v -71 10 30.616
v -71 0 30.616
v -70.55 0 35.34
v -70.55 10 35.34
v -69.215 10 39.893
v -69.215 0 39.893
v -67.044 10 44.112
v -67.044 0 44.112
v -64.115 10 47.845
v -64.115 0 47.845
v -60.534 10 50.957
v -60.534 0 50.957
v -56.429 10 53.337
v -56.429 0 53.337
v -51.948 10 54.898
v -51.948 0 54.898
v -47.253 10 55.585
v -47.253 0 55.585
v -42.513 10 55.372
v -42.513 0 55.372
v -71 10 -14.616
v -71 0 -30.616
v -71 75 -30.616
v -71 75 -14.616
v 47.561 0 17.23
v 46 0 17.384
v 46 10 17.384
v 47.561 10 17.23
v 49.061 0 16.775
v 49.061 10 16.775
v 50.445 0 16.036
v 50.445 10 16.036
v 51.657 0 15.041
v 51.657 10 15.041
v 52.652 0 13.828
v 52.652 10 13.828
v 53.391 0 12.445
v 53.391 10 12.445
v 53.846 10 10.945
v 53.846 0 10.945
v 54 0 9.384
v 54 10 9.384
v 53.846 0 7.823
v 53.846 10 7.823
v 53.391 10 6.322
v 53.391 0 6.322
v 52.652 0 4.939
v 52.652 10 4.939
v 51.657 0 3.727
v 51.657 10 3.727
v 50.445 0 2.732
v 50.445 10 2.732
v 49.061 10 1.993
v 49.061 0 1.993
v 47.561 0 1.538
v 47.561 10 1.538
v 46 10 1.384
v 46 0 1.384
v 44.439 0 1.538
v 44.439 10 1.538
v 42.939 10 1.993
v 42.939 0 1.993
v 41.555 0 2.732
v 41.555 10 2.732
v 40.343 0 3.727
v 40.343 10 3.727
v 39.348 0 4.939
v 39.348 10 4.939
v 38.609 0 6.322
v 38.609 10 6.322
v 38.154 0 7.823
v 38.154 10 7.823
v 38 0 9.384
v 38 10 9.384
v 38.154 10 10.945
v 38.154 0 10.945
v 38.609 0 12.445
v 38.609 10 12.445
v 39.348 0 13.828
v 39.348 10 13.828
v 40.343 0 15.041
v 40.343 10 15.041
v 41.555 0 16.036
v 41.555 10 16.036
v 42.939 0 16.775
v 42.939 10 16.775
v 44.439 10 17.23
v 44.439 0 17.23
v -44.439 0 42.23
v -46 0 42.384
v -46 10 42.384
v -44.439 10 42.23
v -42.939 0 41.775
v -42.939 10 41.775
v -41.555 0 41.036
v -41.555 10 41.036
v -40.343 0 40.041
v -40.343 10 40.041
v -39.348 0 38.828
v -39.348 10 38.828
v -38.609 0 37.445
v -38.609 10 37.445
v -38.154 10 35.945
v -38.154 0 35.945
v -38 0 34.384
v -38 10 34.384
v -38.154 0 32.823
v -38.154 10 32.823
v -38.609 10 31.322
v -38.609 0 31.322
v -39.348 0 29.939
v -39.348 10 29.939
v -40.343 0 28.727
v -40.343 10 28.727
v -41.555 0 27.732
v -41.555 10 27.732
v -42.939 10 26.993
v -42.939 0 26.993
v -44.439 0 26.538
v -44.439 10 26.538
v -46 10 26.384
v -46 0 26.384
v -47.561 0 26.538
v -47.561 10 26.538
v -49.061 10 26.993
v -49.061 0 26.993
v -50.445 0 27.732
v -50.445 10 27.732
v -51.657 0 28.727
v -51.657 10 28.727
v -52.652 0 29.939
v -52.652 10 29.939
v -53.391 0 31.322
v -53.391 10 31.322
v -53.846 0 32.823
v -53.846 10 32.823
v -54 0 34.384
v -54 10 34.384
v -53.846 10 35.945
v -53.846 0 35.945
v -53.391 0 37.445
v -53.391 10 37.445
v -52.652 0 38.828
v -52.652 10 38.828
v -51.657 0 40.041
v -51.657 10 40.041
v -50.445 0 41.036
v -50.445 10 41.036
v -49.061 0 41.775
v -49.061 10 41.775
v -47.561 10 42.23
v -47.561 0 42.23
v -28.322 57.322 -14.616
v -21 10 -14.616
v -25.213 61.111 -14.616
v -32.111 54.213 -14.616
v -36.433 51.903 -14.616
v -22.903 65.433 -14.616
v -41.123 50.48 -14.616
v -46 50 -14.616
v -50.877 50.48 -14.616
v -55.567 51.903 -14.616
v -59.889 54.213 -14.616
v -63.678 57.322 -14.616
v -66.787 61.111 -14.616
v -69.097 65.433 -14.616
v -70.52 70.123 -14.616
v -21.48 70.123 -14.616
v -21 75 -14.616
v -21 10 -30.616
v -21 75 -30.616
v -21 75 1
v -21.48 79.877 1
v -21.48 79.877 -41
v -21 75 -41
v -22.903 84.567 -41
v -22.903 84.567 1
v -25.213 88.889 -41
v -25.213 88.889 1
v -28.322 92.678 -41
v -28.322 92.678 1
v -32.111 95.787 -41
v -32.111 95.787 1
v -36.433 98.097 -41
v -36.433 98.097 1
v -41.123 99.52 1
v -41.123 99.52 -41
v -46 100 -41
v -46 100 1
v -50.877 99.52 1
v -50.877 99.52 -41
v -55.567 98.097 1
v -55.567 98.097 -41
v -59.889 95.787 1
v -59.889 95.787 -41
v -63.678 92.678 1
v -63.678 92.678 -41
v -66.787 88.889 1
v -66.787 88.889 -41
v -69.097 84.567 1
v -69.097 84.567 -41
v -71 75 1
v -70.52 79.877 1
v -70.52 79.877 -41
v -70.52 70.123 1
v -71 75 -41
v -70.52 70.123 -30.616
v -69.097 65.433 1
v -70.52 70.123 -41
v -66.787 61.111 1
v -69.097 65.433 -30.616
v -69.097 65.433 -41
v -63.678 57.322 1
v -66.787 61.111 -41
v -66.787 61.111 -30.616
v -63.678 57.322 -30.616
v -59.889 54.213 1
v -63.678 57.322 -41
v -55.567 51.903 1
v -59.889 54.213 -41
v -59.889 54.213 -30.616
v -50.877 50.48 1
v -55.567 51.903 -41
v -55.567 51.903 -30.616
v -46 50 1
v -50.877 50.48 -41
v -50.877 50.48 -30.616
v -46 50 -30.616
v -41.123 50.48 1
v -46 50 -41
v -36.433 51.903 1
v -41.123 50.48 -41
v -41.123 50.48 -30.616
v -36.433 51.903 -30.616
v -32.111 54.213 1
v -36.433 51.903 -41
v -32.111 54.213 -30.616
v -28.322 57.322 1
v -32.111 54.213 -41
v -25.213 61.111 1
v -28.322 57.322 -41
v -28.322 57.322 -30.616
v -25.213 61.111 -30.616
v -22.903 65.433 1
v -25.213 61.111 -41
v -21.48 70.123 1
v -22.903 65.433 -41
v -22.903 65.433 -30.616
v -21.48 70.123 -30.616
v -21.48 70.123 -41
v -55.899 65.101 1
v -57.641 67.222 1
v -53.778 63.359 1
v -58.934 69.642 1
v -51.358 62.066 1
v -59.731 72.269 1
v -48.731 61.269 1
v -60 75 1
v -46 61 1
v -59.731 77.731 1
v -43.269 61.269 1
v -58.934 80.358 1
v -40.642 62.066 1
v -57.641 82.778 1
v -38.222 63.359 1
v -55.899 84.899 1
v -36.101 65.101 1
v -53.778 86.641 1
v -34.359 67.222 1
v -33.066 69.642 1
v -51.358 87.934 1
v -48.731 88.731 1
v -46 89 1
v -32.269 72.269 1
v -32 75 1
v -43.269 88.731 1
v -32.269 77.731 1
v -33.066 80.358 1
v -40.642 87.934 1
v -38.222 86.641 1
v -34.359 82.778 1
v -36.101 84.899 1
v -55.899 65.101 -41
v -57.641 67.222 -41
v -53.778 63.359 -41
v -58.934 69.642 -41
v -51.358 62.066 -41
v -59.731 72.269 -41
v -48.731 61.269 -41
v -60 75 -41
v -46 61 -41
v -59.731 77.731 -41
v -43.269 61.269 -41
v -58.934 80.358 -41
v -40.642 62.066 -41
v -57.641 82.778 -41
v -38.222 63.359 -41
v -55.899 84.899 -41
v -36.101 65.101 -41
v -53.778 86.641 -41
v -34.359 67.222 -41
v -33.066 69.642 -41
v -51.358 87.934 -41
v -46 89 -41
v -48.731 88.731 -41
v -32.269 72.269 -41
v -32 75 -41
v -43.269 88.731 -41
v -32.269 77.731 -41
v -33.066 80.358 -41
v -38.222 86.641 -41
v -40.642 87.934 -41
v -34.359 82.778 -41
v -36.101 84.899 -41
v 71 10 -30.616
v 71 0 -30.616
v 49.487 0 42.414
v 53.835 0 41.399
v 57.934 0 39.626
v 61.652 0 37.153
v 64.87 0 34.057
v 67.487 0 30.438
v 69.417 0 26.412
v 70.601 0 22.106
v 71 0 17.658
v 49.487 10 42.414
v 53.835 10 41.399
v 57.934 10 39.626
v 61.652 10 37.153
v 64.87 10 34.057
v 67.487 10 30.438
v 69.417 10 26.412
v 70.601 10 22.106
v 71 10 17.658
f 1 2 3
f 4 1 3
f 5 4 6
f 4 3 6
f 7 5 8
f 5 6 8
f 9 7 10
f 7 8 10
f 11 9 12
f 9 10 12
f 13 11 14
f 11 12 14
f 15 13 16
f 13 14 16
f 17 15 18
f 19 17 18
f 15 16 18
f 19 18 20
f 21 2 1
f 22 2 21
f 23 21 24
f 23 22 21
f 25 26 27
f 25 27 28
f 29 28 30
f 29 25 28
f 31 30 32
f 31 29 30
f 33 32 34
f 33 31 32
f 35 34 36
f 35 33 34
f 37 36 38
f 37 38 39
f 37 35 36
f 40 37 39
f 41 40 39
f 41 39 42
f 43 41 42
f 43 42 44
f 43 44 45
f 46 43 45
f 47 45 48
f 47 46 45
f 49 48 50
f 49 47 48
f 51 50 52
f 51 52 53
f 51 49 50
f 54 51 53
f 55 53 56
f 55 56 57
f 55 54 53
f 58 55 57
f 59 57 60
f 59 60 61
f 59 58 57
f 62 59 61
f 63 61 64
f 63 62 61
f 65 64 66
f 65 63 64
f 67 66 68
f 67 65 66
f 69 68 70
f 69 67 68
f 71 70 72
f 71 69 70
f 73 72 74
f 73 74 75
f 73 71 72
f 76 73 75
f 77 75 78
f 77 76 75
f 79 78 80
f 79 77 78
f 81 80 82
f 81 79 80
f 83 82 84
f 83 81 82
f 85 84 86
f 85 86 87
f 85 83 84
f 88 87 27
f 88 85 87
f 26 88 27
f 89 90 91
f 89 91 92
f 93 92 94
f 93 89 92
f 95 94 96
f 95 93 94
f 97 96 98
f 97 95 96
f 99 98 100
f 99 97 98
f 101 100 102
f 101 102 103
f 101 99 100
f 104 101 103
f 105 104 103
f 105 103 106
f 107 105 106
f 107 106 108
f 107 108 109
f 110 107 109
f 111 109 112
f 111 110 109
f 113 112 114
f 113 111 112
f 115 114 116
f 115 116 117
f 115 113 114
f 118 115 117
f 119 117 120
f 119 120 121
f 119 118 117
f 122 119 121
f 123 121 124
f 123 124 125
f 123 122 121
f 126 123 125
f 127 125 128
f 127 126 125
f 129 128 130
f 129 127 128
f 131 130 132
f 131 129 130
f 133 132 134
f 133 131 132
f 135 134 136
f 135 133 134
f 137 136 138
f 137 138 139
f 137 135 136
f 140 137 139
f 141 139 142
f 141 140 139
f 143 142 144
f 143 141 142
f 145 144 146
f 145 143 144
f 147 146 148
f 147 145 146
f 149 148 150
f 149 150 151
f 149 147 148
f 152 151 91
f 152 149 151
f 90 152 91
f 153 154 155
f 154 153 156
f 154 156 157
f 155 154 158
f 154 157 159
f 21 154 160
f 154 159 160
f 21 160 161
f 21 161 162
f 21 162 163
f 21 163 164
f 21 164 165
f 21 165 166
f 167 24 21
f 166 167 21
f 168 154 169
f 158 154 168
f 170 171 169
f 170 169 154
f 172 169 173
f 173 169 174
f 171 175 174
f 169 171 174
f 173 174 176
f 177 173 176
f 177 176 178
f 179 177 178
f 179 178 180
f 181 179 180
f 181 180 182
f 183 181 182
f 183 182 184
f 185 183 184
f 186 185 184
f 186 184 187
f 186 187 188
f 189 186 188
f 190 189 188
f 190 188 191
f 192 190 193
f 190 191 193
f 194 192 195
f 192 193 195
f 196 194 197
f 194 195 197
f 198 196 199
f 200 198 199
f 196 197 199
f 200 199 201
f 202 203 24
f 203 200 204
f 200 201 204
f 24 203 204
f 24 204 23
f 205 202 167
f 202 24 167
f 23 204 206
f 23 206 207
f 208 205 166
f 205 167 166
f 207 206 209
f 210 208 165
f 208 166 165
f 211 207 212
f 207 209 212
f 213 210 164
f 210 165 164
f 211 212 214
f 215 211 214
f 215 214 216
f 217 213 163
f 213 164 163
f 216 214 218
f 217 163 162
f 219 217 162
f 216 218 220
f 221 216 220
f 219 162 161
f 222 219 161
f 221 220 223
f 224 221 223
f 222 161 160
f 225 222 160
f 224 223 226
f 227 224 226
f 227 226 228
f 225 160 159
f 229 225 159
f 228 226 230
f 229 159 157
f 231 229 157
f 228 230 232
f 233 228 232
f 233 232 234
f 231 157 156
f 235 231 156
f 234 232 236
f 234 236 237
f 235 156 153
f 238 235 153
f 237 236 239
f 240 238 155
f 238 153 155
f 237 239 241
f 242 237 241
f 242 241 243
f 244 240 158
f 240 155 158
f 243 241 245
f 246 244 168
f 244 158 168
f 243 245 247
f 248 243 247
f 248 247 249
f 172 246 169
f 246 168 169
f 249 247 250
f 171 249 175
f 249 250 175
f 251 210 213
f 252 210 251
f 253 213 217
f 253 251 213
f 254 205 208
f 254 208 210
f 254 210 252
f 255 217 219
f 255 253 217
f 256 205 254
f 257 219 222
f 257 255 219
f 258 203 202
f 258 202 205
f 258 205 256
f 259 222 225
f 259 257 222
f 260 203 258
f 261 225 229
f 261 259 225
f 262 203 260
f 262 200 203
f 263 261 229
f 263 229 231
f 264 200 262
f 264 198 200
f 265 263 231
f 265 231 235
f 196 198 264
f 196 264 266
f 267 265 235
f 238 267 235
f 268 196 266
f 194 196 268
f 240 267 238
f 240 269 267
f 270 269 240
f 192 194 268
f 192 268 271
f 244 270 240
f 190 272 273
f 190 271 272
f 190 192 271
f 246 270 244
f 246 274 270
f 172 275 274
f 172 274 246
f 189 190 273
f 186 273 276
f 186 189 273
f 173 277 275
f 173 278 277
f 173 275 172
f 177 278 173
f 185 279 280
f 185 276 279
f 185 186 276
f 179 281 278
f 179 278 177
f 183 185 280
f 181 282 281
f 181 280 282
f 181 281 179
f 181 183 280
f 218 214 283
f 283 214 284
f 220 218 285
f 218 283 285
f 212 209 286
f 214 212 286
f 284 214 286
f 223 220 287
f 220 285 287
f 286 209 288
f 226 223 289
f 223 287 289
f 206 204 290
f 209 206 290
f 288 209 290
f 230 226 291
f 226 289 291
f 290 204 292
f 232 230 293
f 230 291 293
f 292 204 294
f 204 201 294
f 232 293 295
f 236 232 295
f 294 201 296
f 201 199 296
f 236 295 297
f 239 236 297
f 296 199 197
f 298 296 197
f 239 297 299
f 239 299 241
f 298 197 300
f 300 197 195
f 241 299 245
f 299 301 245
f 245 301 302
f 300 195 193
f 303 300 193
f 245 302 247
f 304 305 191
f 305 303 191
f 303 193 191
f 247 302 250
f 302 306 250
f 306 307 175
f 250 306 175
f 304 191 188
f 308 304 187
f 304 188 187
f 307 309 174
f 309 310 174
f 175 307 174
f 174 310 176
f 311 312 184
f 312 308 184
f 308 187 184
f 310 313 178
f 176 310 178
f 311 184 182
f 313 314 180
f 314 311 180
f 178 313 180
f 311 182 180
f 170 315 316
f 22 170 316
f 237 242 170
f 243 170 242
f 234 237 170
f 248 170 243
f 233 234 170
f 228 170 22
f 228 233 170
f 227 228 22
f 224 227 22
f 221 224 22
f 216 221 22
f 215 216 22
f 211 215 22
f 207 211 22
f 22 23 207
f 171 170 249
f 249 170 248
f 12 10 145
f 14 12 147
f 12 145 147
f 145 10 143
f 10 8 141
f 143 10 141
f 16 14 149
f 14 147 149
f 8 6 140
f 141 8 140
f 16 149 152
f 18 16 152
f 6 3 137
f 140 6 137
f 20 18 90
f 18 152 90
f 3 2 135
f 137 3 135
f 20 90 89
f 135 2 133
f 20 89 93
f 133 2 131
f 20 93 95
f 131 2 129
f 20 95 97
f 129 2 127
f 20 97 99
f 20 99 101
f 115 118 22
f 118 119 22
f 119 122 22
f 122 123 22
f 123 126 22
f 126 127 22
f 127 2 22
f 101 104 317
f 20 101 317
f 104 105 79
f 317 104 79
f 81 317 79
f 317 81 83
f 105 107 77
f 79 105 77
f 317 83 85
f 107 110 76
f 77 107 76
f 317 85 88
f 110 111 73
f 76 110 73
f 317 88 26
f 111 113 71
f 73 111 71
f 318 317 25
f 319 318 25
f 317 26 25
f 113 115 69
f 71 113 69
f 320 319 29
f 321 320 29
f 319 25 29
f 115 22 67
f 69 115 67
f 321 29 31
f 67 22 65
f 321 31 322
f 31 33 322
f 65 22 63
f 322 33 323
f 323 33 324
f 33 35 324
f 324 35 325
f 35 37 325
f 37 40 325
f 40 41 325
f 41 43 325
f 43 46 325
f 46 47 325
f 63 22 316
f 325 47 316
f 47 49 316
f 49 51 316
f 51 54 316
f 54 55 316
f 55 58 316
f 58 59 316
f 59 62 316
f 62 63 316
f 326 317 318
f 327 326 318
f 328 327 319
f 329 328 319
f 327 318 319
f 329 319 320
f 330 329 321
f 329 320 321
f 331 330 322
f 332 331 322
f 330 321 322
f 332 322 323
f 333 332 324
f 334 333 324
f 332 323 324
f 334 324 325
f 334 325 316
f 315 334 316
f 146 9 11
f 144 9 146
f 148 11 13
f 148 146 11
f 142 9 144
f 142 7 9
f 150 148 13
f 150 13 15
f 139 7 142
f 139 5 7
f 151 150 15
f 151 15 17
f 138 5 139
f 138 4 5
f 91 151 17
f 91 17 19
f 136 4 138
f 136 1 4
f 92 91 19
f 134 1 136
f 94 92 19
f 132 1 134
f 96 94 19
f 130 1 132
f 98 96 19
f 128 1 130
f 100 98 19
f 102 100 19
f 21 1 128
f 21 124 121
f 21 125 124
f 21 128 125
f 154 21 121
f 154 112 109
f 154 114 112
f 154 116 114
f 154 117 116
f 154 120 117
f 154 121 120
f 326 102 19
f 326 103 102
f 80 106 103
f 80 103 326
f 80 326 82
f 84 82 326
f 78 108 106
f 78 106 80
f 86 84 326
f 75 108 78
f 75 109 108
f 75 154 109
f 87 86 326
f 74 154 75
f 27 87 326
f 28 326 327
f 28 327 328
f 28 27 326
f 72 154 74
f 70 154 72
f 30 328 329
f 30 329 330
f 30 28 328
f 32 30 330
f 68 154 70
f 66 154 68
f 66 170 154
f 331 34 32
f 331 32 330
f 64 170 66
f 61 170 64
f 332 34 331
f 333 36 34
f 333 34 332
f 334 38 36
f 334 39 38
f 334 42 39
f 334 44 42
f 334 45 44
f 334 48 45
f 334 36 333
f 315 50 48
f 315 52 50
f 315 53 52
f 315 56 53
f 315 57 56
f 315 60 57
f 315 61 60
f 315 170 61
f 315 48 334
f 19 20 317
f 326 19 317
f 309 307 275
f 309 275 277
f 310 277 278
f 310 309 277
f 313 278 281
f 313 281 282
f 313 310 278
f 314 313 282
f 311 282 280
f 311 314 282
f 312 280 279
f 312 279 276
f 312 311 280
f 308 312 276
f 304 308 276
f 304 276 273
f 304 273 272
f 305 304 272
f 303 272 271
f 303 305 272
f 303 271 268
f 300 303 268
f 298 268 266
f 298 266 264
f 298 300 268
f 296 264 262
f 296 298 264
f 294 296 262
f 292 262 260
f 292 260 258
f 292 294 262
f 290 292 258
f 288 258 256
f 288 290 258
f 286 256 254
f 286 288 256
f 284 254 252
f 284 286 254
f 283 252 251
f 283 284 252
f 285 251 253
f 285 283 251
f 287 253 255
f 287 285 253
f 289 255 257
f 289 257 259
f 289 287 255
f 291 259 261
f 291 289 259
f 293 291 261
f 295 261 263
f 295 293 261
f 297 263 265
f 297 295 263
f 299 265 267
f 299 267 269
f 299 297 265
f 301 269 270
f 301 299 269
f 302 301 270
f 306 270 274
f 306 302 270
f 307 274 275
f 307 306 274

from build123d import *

# Parameters (mm, degrees)
SKETCH1_R                = 8
BOSS_EXTRUDE1_DEPTH      = 10
BOSS_EXTRUDE2_DEPTH      = 1
BOSS_EXTRUDE2_DEPTH_BACK = 41
SKETCH2_R                = 25
SKETCH2_R_2              = 14
BOSS_EXTRUDE3_DEPTH      = 16


with BuildPart() as part:
    # Sketch1 → Boss-Extrude1 (new body)
    with BuildSketch(Plane(origin=(0, 0, 0), x_dir=(1, 0, 0), z_dir=(0, 1, 0))):
        with BuildLine():
            Line((0, 30.616062134), (-71, 30.616062134))
            Line((-71, 30.616062134), (-71, -30.616062134))
            ThreePointArc((-71, -30.616062134), (-62.398661132, -49.486247959), (-42.513286954, -55.371724761))
            Line((-42.513286954, -55.371724761), (49.486713046, -42.413978282))
            ThreePointArc((49.486713046, -42.413978282), (64.870185825, -34.056976787), (71, -17.658315655))
            Line((71, -17.658315655), (71, 30.616062134))
            Line((71, 30.616062134), (0, 30.616062134))
        make_face()
        with Locations(Location((46, -9.383937866, 0), (0, 0, 270))):
            Circle(SKETCH1_R, mode=Mode.SUBTRACT)
        with Locations(Location((-46, -34.383937866, 0), (0, 0, 270))):
            Circle(SKETCH1_R, mode=Mode.SUBTRACT)
    extrude(amount=BOSS_EXTRUDE1_DEPTH)



with BuildPart() as body_2:
    # Sketch2 → Boss-Extrude2 (new, two sides: drawn at the far end of the back side and taken through both)
    with BuildSketch(Plane.XY.offset(-BOSS_EXTRUDE2_DEPTH_BACK)):
        with Locations((-46, 75)):
            Circle(SKETCH2_R)
        with Locations((-46, 75)):
            Circle(SKETCH2_R_2, mode=Mode.SUBTRACT)
    extrude(amount=BOSS_EXTRUDE2_DEPTH + BOSS_EXTRUDE2_DEPTH_BACK)


with BuildPart() as part_1:
    add(part.part)

    add(body_2.part)  # Boss-Extrude3 merges body 2
    # Sketch3 → Boss-Extrude3 (add)
    with BuildSketch(Plane(origin=(0, 0, -30.616062134), x_dir=(-1, 0, 0), z_dir=(0, 0, -1))):
        with BuildLine():
            Line((21, 10), (71, 10))
            Line((71, 10), (71, 75))
            ThreePointArc((71, 75), (46, 50), (21, 75))
            Line((21, 75), (21, 10))
        make_face()
    extrude(amount=-BOSS_EXTRUDE3_DEPTH)


solid = part_1.part
